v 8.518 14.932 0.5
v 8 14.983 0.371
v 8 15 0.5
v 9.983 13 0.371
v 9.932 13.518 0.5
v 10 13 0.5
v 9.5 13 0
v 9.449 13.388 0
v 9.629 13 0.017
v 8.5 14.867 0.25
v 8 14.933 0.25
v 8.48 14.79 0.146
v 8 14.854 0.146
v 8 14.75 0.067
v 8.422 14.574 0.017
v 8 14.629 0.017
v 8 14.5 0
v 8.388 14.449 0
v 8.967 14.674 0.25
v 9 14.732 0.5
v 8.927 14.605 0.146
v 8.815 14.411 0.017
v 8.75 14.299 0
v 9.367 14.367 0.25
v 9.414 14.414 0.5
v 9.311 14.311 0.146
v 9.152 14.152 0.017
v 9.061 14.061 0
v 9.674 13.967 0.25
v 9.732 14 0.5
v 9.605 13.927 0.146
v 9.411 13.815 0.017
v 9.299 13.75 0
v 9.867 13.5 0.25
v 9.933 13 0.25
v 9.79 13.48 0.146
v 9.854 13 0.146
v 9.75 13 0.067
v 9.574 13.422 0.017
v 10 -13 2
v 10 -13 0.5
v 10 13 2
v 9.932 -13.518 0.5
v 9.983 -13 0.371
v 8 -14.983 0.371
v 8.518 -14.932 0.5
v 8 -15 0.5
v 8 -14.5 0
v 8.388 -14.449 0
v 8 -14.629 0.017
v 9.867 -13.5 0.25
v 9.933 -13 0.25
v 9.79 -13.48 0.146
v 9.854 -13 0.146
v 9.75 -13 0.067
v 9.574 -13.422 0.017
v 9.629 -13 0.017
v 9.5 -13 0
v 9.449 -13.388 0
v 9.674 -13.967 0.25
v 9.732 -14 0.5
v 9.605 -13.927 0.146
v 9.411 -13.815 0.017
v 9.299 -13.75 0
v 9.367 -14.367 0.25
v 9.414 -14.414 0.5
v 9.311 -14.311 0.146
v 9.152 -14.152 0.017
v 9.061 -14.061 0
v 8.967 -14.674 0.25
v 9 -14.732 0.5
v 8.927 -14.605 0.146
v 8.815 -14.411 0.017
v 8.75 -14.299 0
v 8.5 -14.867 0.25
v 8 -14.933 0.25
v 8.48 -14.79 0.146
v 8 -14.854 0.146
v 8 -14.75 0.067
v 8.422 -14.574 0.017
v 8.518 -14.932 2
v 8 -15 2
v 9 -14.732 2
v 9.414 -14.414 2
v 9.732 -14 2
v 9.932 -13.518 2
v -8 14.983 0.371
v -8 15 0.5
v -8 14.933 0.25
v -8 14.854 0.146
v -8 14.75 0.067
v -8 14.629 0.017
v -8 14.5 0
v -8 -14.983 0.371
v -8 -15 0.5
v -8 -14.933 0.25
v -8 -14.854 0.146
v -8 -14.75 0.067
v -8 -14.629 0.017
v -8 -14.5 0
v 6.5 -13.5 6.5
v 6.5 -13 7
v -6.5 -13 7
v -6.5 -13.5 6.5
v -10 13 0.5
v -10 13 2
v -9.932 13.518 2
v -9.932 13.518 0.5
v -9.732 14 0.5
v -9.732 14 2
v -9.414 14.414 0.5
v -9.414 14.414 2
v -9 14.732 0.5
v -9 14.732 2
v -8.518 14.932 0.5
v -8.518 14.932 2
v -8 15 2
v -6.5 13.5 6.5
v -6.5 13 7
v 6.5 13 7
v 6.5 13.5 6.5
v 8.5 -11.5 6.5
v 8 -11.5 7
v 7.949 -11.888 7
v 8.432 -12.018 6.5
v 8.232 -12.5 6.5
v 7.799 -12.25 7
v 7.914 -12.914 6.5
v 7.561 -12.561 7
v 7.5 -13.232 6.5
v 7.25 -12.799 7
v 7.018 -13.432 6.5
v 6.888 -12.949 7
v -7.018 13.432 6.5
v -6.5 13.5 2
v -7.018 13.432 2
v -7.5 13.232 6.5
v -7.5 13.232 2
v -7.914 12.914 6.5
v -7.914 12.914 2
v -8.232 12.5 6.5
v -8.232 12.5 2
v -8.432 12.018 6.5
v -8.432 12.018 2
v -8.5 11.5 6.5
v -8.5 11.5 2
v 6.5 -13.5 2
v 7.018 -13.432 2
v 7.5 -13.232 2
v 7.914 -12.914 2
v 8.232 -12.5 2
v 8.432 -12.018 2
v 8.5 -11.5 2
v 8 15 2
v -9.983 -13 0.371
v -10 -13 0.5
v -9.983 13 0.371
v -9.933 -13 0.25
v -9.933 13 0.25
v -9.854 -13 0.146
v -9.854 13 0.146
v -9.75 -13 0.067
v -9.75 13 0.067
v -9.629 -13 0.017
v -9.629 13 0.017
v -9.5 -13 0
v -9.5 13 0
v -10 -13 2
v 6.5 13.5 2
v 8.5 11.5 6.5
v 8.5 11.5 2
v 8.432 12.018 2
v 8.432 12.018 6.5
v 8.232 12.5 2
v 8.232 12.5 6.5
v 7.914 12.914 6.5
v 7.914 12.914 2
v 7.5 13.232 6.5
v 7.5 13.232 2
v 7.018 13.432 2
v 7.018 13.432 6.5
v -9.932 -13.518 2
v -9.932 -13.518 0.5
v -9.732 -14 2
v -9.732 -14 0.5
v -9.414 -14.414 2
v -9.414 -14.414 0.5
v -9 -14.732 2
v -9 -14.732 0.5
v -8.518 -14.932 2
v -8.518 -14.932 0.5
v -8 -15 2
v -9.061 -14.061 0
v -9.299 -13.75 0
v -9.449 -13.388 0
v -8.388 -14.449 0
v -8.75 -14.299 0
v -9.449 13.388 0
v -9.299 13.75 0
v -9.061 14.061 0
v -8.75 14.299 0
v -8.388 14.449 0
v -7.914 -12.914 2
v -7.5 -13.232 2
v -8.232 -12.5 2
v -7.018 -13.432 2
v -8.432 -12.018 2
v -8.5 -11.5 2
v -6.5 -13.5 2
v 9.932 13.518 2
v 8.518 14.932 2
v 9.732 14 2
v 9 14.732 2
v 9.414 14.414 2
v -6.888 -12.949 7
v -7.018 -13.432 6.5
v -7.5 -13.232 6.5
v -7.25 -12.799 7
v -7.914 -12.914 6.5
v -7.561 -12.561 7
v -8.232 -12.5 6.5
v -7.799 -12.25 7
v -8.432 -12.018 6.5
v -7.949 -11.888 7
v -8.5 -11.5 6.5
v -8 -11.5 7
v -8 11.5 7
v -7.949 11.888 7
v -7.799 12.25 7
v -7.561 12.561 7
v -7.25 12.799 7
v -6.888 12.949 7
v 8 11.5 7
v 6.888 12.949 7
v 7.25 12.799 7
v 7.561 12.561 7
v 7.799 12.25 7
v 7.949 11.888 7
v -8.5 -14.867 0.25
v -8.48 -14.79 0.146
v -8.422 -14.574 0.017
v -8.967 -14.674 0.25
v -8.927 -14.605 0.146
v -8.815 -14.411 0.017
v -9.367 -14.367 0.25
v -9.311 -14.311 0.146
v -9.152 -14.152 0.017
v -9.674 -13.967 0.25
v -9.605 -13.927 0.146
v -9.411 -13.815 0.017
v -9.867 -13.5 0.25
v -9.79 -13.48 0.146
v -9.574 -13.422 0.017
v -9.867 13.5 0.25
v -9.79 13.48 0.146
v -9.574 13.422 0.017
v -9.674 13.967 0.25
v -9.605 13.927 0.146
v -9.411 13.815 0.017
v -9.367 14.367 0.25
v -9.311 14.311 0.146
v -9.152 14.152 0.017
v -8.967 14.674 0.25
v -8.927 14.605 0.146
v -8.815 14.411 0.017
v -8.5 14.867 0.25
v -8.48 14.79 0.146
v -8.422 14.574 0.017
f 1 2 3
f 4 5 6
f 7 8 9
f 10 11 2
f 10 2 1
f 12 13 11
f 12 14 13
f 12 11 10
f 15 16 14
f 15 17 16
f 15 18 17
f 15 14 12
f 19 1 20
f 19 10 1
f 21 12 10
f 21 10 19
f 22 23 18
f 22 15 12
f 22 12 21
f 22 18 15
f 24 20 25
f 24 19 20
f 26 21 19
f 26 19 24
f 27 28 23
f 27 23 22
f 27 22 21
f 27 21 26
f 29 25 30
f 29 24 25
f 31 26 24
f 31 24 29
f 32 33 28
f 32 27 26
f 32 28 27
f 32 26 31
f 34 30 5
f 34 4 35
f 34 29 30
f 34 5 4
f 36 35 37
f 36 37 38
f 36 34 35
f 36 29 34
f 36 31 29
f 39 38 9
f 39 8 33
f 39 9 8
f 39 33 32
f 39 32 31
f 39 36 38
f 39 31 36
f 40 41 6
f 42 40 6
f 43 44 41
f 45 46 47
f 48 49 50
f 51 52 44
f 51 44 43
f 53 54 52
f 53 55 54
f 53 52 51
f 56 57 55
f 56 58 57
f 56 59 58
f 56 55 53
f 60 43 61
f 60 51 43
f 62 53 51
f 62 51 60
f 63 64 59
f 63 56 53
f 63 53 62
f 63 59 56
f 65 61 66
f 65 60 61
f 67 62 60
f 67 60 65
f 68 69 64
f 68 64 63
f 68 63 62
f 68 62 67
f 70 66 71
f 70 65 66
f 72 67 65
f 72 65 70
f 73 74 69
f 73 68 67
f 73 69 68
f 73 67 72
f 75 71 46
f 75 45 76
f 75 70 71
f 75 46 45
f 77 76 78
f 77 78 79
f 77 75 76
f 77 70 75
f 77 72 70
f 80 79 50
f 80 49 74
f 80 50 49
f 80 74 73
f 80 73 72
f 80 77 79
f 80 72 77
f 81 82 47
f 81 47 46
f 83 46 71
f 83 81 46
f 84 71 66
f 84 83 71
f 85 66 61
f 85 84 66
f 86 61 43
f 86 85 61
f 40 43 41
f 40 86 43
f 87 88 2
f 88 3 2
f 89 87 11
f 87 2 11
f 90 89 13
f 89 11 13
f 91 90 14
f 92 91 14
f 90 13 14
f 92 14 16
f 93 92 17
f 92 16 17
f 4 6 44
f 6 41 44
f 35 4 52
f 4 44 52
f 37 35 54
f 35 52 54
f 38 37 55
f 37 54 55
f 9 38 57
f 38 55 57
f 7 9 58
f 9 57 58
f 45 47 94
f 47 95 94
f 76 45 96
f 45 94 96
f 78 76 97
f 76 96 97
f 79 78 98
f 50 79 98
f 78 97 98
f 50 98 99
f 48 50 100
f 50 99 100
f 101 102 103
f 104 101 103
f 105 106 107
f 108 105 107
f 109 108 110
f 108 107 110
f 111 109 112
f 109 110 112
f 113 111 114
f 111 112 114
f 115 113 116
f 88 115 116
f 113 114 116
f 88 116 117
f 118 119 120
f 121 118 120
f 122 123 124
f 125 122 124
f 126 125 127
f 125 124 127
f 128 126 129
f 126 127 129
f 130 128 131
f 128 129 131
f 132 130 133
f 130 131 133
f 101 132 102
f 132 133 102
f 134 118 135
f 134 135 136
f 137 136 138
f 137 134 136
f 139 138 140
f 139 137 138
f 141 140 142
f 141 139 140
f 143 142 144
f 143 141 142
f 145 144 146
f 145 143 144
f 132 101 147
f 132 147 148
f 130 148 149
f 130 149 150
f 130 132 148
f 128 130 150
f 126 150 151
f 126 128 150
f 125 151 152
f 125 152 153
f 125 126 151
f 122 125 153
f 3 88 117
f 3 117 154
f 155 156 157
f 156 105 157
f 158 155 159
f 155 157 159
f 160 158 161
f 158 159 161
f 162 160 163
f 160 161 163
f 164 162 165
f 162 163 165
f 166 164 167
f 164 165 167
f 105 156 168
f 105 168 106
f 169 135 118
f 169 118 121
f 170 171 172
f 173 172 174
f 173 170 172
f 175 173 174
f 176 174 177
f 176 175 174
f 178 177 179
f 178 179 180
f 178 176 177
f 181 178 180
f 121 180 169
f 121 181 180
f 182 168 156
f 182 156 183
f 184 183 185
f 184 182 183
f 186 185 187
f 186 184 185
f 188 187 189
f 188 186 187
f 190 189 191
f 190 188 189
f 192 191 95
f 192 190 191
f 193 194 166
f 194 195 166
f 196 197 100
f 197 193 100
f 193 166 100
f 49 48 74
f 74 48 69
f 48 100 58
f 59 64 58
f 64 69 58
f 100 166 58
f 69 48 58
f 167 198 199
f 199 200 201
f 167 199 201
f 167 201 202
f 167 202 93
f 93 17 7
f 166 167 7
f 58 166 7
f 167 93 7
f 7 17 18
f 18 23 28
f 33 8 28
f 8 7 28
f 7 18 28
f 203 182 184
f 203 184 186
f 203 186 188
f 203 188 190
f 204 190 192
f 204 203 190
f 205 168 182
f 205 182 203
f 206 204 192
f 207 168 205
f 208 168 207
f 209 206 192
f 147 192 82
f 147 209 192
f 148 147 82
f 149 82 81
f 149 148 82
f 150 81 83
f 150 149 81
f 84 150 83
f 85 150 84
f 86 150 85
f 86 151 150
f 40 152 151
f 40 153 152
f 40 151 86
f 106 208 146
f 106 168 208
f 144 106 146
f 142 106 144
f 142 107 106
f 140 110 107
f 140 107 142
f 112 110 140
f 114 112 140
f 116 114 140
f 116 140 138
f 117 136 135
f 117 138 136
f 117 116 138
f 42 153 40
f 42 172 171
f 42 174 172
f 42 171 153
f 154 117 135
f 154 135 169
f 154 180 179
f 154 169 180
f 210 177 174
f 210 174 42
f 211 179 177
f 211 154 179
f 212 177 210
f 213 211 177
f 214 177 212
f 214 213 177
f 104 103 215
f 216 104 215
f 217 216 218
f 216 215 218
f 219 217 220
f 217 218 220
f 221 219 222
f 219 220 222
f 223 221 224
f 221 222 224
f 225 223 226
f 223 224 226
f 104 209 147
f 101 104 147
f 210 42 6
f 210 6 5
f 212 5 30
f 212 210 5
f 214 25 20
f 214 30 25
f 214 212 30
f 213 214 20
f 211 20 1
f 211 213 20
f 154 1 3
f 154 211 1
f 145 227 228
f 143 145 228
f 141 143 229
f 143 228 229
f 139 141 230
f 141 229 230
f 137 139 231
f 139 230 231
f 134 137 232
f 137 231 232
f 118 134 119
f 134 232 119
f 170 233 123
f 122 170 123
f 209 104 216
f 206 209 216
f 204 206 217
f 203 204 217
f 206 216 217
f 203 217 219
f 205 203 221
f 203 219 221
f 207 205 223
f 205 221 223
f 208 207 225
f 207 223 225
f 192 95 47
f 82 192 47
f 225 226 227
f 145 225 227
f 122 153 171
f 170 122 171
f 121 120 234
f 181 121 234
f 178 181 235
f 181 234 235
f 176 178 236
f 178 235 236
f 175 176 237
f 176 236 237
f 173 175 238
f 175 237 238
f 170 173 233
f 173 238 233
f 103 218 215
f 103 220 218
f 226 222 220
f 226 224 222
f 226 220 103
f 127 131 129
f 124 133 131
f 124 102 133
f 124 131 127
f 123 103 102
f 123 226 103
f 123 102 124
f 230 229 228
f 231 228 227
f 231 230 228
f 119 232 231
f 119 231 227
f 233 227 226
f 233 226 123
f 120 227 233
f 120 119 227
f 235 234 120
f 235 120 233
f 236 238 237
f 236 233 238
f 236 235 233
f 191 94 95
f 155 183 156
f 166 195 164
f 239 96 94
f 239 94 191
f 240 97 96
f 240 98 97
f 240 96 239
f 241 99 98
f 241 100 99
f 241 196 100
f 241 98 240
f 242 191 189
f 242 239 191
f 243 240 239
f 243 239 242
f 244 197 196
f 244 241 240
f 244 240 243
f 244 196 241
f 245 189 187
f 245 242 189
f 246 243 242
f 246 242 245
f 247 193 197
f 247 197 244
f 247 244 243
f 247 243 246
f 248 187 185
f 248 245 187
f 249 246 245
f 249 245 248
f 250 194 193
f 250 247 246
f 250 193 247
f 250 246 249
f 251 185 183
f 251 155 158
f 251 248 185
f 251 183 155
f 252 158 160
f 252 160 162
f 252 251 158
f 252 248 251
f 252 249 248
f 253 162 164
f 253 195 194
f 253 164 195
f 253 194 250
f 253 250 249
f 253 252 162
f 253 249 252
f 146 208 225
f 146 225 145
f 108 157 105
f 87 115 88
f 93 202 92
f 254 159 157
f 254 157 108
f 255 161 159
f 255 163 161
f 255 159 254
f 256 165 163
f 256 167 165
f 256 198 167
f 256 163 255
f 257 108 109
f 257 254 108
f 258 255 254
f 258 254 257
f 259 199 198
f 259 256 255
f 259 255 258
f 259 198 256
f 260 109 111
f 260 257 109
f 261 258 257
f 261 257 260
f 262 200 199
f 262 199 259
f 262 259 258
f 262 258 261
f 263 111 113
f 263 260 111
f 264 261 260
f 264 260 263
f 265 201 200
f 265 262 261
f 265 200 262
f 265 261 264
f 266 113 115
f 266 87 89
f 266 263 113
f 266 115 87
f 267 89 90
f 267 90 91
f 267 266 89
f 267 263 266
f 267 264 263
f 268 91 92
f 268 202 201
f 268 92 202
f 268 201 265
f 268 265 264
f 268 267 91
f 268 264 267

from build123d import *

# Parameters (mm, degrees)
F0_W     = 20
F0_H     = 30
F1_DEPTH = 2
F2_R     = 2
F3_W     = 17
F3_H     = 27
F4_DEPTH = 5
F5_R     = 2
F6_SIZE  = 0.5
F7_R     = 0.5


with BuildPart() as f1:
    # F0 (on Top) → F1 (new body)
    with BuildSketch(Plane.XY):
        Rectangle(F0_W, F0_H)
    extrude(amount=F1_DEPTH)

    # F2
    f2_edges = [f1.edges().sort_by_distance(p)[0] for p in [
        (-10, -15, 1),
        (10, -15, 1),
        (-10, 15, 1),
        (10, 15, 1),
    ]]
    fillet(f2_edges, radius=F2_R)

    # F3 (on face) → F4 (join)
    with BuildSketch(Plane.XY.offset(2)):
        Rectangle(F3_W, F3_H)
    extrude(amount=F4_DEPTH)

    # F5
    f5_edges = [f1.edges().sort_by_distance(p)[0] for p in [
        (-8.5, -13.5, 4.5),
        (8.5, -13.5, 4.5),
        (-8.5, 13.5, 4.5),
        (8.5, 13.5, 4.5),
    ]]
    fillet(f5_edges, radius=F5_R)

    # F6
    f6_edges = [f1.edges().sort_by_distance(p)[0] for p in [
        (-8.5, 0, 7),
    ]]
    chamfer(f6_edges, length=F6_SIZE)

    # F7
    f7_edges = [f1.edges().sort_by_distance(p)[0] for p in [
        (0, 15, 0),
        (9.414214, 14.414214, 0),
        (-9.414214, 14.414214, 0),
        (10, 0, 0),
        (-10, 0, 0),
        (9.414214, -14.414214, 0),
        (-9.414214, -14.414214, 0),
        (0, -15, 0),
    ]]
    fillet(f7_edges, radius=F7_R)


solid = f1.part
